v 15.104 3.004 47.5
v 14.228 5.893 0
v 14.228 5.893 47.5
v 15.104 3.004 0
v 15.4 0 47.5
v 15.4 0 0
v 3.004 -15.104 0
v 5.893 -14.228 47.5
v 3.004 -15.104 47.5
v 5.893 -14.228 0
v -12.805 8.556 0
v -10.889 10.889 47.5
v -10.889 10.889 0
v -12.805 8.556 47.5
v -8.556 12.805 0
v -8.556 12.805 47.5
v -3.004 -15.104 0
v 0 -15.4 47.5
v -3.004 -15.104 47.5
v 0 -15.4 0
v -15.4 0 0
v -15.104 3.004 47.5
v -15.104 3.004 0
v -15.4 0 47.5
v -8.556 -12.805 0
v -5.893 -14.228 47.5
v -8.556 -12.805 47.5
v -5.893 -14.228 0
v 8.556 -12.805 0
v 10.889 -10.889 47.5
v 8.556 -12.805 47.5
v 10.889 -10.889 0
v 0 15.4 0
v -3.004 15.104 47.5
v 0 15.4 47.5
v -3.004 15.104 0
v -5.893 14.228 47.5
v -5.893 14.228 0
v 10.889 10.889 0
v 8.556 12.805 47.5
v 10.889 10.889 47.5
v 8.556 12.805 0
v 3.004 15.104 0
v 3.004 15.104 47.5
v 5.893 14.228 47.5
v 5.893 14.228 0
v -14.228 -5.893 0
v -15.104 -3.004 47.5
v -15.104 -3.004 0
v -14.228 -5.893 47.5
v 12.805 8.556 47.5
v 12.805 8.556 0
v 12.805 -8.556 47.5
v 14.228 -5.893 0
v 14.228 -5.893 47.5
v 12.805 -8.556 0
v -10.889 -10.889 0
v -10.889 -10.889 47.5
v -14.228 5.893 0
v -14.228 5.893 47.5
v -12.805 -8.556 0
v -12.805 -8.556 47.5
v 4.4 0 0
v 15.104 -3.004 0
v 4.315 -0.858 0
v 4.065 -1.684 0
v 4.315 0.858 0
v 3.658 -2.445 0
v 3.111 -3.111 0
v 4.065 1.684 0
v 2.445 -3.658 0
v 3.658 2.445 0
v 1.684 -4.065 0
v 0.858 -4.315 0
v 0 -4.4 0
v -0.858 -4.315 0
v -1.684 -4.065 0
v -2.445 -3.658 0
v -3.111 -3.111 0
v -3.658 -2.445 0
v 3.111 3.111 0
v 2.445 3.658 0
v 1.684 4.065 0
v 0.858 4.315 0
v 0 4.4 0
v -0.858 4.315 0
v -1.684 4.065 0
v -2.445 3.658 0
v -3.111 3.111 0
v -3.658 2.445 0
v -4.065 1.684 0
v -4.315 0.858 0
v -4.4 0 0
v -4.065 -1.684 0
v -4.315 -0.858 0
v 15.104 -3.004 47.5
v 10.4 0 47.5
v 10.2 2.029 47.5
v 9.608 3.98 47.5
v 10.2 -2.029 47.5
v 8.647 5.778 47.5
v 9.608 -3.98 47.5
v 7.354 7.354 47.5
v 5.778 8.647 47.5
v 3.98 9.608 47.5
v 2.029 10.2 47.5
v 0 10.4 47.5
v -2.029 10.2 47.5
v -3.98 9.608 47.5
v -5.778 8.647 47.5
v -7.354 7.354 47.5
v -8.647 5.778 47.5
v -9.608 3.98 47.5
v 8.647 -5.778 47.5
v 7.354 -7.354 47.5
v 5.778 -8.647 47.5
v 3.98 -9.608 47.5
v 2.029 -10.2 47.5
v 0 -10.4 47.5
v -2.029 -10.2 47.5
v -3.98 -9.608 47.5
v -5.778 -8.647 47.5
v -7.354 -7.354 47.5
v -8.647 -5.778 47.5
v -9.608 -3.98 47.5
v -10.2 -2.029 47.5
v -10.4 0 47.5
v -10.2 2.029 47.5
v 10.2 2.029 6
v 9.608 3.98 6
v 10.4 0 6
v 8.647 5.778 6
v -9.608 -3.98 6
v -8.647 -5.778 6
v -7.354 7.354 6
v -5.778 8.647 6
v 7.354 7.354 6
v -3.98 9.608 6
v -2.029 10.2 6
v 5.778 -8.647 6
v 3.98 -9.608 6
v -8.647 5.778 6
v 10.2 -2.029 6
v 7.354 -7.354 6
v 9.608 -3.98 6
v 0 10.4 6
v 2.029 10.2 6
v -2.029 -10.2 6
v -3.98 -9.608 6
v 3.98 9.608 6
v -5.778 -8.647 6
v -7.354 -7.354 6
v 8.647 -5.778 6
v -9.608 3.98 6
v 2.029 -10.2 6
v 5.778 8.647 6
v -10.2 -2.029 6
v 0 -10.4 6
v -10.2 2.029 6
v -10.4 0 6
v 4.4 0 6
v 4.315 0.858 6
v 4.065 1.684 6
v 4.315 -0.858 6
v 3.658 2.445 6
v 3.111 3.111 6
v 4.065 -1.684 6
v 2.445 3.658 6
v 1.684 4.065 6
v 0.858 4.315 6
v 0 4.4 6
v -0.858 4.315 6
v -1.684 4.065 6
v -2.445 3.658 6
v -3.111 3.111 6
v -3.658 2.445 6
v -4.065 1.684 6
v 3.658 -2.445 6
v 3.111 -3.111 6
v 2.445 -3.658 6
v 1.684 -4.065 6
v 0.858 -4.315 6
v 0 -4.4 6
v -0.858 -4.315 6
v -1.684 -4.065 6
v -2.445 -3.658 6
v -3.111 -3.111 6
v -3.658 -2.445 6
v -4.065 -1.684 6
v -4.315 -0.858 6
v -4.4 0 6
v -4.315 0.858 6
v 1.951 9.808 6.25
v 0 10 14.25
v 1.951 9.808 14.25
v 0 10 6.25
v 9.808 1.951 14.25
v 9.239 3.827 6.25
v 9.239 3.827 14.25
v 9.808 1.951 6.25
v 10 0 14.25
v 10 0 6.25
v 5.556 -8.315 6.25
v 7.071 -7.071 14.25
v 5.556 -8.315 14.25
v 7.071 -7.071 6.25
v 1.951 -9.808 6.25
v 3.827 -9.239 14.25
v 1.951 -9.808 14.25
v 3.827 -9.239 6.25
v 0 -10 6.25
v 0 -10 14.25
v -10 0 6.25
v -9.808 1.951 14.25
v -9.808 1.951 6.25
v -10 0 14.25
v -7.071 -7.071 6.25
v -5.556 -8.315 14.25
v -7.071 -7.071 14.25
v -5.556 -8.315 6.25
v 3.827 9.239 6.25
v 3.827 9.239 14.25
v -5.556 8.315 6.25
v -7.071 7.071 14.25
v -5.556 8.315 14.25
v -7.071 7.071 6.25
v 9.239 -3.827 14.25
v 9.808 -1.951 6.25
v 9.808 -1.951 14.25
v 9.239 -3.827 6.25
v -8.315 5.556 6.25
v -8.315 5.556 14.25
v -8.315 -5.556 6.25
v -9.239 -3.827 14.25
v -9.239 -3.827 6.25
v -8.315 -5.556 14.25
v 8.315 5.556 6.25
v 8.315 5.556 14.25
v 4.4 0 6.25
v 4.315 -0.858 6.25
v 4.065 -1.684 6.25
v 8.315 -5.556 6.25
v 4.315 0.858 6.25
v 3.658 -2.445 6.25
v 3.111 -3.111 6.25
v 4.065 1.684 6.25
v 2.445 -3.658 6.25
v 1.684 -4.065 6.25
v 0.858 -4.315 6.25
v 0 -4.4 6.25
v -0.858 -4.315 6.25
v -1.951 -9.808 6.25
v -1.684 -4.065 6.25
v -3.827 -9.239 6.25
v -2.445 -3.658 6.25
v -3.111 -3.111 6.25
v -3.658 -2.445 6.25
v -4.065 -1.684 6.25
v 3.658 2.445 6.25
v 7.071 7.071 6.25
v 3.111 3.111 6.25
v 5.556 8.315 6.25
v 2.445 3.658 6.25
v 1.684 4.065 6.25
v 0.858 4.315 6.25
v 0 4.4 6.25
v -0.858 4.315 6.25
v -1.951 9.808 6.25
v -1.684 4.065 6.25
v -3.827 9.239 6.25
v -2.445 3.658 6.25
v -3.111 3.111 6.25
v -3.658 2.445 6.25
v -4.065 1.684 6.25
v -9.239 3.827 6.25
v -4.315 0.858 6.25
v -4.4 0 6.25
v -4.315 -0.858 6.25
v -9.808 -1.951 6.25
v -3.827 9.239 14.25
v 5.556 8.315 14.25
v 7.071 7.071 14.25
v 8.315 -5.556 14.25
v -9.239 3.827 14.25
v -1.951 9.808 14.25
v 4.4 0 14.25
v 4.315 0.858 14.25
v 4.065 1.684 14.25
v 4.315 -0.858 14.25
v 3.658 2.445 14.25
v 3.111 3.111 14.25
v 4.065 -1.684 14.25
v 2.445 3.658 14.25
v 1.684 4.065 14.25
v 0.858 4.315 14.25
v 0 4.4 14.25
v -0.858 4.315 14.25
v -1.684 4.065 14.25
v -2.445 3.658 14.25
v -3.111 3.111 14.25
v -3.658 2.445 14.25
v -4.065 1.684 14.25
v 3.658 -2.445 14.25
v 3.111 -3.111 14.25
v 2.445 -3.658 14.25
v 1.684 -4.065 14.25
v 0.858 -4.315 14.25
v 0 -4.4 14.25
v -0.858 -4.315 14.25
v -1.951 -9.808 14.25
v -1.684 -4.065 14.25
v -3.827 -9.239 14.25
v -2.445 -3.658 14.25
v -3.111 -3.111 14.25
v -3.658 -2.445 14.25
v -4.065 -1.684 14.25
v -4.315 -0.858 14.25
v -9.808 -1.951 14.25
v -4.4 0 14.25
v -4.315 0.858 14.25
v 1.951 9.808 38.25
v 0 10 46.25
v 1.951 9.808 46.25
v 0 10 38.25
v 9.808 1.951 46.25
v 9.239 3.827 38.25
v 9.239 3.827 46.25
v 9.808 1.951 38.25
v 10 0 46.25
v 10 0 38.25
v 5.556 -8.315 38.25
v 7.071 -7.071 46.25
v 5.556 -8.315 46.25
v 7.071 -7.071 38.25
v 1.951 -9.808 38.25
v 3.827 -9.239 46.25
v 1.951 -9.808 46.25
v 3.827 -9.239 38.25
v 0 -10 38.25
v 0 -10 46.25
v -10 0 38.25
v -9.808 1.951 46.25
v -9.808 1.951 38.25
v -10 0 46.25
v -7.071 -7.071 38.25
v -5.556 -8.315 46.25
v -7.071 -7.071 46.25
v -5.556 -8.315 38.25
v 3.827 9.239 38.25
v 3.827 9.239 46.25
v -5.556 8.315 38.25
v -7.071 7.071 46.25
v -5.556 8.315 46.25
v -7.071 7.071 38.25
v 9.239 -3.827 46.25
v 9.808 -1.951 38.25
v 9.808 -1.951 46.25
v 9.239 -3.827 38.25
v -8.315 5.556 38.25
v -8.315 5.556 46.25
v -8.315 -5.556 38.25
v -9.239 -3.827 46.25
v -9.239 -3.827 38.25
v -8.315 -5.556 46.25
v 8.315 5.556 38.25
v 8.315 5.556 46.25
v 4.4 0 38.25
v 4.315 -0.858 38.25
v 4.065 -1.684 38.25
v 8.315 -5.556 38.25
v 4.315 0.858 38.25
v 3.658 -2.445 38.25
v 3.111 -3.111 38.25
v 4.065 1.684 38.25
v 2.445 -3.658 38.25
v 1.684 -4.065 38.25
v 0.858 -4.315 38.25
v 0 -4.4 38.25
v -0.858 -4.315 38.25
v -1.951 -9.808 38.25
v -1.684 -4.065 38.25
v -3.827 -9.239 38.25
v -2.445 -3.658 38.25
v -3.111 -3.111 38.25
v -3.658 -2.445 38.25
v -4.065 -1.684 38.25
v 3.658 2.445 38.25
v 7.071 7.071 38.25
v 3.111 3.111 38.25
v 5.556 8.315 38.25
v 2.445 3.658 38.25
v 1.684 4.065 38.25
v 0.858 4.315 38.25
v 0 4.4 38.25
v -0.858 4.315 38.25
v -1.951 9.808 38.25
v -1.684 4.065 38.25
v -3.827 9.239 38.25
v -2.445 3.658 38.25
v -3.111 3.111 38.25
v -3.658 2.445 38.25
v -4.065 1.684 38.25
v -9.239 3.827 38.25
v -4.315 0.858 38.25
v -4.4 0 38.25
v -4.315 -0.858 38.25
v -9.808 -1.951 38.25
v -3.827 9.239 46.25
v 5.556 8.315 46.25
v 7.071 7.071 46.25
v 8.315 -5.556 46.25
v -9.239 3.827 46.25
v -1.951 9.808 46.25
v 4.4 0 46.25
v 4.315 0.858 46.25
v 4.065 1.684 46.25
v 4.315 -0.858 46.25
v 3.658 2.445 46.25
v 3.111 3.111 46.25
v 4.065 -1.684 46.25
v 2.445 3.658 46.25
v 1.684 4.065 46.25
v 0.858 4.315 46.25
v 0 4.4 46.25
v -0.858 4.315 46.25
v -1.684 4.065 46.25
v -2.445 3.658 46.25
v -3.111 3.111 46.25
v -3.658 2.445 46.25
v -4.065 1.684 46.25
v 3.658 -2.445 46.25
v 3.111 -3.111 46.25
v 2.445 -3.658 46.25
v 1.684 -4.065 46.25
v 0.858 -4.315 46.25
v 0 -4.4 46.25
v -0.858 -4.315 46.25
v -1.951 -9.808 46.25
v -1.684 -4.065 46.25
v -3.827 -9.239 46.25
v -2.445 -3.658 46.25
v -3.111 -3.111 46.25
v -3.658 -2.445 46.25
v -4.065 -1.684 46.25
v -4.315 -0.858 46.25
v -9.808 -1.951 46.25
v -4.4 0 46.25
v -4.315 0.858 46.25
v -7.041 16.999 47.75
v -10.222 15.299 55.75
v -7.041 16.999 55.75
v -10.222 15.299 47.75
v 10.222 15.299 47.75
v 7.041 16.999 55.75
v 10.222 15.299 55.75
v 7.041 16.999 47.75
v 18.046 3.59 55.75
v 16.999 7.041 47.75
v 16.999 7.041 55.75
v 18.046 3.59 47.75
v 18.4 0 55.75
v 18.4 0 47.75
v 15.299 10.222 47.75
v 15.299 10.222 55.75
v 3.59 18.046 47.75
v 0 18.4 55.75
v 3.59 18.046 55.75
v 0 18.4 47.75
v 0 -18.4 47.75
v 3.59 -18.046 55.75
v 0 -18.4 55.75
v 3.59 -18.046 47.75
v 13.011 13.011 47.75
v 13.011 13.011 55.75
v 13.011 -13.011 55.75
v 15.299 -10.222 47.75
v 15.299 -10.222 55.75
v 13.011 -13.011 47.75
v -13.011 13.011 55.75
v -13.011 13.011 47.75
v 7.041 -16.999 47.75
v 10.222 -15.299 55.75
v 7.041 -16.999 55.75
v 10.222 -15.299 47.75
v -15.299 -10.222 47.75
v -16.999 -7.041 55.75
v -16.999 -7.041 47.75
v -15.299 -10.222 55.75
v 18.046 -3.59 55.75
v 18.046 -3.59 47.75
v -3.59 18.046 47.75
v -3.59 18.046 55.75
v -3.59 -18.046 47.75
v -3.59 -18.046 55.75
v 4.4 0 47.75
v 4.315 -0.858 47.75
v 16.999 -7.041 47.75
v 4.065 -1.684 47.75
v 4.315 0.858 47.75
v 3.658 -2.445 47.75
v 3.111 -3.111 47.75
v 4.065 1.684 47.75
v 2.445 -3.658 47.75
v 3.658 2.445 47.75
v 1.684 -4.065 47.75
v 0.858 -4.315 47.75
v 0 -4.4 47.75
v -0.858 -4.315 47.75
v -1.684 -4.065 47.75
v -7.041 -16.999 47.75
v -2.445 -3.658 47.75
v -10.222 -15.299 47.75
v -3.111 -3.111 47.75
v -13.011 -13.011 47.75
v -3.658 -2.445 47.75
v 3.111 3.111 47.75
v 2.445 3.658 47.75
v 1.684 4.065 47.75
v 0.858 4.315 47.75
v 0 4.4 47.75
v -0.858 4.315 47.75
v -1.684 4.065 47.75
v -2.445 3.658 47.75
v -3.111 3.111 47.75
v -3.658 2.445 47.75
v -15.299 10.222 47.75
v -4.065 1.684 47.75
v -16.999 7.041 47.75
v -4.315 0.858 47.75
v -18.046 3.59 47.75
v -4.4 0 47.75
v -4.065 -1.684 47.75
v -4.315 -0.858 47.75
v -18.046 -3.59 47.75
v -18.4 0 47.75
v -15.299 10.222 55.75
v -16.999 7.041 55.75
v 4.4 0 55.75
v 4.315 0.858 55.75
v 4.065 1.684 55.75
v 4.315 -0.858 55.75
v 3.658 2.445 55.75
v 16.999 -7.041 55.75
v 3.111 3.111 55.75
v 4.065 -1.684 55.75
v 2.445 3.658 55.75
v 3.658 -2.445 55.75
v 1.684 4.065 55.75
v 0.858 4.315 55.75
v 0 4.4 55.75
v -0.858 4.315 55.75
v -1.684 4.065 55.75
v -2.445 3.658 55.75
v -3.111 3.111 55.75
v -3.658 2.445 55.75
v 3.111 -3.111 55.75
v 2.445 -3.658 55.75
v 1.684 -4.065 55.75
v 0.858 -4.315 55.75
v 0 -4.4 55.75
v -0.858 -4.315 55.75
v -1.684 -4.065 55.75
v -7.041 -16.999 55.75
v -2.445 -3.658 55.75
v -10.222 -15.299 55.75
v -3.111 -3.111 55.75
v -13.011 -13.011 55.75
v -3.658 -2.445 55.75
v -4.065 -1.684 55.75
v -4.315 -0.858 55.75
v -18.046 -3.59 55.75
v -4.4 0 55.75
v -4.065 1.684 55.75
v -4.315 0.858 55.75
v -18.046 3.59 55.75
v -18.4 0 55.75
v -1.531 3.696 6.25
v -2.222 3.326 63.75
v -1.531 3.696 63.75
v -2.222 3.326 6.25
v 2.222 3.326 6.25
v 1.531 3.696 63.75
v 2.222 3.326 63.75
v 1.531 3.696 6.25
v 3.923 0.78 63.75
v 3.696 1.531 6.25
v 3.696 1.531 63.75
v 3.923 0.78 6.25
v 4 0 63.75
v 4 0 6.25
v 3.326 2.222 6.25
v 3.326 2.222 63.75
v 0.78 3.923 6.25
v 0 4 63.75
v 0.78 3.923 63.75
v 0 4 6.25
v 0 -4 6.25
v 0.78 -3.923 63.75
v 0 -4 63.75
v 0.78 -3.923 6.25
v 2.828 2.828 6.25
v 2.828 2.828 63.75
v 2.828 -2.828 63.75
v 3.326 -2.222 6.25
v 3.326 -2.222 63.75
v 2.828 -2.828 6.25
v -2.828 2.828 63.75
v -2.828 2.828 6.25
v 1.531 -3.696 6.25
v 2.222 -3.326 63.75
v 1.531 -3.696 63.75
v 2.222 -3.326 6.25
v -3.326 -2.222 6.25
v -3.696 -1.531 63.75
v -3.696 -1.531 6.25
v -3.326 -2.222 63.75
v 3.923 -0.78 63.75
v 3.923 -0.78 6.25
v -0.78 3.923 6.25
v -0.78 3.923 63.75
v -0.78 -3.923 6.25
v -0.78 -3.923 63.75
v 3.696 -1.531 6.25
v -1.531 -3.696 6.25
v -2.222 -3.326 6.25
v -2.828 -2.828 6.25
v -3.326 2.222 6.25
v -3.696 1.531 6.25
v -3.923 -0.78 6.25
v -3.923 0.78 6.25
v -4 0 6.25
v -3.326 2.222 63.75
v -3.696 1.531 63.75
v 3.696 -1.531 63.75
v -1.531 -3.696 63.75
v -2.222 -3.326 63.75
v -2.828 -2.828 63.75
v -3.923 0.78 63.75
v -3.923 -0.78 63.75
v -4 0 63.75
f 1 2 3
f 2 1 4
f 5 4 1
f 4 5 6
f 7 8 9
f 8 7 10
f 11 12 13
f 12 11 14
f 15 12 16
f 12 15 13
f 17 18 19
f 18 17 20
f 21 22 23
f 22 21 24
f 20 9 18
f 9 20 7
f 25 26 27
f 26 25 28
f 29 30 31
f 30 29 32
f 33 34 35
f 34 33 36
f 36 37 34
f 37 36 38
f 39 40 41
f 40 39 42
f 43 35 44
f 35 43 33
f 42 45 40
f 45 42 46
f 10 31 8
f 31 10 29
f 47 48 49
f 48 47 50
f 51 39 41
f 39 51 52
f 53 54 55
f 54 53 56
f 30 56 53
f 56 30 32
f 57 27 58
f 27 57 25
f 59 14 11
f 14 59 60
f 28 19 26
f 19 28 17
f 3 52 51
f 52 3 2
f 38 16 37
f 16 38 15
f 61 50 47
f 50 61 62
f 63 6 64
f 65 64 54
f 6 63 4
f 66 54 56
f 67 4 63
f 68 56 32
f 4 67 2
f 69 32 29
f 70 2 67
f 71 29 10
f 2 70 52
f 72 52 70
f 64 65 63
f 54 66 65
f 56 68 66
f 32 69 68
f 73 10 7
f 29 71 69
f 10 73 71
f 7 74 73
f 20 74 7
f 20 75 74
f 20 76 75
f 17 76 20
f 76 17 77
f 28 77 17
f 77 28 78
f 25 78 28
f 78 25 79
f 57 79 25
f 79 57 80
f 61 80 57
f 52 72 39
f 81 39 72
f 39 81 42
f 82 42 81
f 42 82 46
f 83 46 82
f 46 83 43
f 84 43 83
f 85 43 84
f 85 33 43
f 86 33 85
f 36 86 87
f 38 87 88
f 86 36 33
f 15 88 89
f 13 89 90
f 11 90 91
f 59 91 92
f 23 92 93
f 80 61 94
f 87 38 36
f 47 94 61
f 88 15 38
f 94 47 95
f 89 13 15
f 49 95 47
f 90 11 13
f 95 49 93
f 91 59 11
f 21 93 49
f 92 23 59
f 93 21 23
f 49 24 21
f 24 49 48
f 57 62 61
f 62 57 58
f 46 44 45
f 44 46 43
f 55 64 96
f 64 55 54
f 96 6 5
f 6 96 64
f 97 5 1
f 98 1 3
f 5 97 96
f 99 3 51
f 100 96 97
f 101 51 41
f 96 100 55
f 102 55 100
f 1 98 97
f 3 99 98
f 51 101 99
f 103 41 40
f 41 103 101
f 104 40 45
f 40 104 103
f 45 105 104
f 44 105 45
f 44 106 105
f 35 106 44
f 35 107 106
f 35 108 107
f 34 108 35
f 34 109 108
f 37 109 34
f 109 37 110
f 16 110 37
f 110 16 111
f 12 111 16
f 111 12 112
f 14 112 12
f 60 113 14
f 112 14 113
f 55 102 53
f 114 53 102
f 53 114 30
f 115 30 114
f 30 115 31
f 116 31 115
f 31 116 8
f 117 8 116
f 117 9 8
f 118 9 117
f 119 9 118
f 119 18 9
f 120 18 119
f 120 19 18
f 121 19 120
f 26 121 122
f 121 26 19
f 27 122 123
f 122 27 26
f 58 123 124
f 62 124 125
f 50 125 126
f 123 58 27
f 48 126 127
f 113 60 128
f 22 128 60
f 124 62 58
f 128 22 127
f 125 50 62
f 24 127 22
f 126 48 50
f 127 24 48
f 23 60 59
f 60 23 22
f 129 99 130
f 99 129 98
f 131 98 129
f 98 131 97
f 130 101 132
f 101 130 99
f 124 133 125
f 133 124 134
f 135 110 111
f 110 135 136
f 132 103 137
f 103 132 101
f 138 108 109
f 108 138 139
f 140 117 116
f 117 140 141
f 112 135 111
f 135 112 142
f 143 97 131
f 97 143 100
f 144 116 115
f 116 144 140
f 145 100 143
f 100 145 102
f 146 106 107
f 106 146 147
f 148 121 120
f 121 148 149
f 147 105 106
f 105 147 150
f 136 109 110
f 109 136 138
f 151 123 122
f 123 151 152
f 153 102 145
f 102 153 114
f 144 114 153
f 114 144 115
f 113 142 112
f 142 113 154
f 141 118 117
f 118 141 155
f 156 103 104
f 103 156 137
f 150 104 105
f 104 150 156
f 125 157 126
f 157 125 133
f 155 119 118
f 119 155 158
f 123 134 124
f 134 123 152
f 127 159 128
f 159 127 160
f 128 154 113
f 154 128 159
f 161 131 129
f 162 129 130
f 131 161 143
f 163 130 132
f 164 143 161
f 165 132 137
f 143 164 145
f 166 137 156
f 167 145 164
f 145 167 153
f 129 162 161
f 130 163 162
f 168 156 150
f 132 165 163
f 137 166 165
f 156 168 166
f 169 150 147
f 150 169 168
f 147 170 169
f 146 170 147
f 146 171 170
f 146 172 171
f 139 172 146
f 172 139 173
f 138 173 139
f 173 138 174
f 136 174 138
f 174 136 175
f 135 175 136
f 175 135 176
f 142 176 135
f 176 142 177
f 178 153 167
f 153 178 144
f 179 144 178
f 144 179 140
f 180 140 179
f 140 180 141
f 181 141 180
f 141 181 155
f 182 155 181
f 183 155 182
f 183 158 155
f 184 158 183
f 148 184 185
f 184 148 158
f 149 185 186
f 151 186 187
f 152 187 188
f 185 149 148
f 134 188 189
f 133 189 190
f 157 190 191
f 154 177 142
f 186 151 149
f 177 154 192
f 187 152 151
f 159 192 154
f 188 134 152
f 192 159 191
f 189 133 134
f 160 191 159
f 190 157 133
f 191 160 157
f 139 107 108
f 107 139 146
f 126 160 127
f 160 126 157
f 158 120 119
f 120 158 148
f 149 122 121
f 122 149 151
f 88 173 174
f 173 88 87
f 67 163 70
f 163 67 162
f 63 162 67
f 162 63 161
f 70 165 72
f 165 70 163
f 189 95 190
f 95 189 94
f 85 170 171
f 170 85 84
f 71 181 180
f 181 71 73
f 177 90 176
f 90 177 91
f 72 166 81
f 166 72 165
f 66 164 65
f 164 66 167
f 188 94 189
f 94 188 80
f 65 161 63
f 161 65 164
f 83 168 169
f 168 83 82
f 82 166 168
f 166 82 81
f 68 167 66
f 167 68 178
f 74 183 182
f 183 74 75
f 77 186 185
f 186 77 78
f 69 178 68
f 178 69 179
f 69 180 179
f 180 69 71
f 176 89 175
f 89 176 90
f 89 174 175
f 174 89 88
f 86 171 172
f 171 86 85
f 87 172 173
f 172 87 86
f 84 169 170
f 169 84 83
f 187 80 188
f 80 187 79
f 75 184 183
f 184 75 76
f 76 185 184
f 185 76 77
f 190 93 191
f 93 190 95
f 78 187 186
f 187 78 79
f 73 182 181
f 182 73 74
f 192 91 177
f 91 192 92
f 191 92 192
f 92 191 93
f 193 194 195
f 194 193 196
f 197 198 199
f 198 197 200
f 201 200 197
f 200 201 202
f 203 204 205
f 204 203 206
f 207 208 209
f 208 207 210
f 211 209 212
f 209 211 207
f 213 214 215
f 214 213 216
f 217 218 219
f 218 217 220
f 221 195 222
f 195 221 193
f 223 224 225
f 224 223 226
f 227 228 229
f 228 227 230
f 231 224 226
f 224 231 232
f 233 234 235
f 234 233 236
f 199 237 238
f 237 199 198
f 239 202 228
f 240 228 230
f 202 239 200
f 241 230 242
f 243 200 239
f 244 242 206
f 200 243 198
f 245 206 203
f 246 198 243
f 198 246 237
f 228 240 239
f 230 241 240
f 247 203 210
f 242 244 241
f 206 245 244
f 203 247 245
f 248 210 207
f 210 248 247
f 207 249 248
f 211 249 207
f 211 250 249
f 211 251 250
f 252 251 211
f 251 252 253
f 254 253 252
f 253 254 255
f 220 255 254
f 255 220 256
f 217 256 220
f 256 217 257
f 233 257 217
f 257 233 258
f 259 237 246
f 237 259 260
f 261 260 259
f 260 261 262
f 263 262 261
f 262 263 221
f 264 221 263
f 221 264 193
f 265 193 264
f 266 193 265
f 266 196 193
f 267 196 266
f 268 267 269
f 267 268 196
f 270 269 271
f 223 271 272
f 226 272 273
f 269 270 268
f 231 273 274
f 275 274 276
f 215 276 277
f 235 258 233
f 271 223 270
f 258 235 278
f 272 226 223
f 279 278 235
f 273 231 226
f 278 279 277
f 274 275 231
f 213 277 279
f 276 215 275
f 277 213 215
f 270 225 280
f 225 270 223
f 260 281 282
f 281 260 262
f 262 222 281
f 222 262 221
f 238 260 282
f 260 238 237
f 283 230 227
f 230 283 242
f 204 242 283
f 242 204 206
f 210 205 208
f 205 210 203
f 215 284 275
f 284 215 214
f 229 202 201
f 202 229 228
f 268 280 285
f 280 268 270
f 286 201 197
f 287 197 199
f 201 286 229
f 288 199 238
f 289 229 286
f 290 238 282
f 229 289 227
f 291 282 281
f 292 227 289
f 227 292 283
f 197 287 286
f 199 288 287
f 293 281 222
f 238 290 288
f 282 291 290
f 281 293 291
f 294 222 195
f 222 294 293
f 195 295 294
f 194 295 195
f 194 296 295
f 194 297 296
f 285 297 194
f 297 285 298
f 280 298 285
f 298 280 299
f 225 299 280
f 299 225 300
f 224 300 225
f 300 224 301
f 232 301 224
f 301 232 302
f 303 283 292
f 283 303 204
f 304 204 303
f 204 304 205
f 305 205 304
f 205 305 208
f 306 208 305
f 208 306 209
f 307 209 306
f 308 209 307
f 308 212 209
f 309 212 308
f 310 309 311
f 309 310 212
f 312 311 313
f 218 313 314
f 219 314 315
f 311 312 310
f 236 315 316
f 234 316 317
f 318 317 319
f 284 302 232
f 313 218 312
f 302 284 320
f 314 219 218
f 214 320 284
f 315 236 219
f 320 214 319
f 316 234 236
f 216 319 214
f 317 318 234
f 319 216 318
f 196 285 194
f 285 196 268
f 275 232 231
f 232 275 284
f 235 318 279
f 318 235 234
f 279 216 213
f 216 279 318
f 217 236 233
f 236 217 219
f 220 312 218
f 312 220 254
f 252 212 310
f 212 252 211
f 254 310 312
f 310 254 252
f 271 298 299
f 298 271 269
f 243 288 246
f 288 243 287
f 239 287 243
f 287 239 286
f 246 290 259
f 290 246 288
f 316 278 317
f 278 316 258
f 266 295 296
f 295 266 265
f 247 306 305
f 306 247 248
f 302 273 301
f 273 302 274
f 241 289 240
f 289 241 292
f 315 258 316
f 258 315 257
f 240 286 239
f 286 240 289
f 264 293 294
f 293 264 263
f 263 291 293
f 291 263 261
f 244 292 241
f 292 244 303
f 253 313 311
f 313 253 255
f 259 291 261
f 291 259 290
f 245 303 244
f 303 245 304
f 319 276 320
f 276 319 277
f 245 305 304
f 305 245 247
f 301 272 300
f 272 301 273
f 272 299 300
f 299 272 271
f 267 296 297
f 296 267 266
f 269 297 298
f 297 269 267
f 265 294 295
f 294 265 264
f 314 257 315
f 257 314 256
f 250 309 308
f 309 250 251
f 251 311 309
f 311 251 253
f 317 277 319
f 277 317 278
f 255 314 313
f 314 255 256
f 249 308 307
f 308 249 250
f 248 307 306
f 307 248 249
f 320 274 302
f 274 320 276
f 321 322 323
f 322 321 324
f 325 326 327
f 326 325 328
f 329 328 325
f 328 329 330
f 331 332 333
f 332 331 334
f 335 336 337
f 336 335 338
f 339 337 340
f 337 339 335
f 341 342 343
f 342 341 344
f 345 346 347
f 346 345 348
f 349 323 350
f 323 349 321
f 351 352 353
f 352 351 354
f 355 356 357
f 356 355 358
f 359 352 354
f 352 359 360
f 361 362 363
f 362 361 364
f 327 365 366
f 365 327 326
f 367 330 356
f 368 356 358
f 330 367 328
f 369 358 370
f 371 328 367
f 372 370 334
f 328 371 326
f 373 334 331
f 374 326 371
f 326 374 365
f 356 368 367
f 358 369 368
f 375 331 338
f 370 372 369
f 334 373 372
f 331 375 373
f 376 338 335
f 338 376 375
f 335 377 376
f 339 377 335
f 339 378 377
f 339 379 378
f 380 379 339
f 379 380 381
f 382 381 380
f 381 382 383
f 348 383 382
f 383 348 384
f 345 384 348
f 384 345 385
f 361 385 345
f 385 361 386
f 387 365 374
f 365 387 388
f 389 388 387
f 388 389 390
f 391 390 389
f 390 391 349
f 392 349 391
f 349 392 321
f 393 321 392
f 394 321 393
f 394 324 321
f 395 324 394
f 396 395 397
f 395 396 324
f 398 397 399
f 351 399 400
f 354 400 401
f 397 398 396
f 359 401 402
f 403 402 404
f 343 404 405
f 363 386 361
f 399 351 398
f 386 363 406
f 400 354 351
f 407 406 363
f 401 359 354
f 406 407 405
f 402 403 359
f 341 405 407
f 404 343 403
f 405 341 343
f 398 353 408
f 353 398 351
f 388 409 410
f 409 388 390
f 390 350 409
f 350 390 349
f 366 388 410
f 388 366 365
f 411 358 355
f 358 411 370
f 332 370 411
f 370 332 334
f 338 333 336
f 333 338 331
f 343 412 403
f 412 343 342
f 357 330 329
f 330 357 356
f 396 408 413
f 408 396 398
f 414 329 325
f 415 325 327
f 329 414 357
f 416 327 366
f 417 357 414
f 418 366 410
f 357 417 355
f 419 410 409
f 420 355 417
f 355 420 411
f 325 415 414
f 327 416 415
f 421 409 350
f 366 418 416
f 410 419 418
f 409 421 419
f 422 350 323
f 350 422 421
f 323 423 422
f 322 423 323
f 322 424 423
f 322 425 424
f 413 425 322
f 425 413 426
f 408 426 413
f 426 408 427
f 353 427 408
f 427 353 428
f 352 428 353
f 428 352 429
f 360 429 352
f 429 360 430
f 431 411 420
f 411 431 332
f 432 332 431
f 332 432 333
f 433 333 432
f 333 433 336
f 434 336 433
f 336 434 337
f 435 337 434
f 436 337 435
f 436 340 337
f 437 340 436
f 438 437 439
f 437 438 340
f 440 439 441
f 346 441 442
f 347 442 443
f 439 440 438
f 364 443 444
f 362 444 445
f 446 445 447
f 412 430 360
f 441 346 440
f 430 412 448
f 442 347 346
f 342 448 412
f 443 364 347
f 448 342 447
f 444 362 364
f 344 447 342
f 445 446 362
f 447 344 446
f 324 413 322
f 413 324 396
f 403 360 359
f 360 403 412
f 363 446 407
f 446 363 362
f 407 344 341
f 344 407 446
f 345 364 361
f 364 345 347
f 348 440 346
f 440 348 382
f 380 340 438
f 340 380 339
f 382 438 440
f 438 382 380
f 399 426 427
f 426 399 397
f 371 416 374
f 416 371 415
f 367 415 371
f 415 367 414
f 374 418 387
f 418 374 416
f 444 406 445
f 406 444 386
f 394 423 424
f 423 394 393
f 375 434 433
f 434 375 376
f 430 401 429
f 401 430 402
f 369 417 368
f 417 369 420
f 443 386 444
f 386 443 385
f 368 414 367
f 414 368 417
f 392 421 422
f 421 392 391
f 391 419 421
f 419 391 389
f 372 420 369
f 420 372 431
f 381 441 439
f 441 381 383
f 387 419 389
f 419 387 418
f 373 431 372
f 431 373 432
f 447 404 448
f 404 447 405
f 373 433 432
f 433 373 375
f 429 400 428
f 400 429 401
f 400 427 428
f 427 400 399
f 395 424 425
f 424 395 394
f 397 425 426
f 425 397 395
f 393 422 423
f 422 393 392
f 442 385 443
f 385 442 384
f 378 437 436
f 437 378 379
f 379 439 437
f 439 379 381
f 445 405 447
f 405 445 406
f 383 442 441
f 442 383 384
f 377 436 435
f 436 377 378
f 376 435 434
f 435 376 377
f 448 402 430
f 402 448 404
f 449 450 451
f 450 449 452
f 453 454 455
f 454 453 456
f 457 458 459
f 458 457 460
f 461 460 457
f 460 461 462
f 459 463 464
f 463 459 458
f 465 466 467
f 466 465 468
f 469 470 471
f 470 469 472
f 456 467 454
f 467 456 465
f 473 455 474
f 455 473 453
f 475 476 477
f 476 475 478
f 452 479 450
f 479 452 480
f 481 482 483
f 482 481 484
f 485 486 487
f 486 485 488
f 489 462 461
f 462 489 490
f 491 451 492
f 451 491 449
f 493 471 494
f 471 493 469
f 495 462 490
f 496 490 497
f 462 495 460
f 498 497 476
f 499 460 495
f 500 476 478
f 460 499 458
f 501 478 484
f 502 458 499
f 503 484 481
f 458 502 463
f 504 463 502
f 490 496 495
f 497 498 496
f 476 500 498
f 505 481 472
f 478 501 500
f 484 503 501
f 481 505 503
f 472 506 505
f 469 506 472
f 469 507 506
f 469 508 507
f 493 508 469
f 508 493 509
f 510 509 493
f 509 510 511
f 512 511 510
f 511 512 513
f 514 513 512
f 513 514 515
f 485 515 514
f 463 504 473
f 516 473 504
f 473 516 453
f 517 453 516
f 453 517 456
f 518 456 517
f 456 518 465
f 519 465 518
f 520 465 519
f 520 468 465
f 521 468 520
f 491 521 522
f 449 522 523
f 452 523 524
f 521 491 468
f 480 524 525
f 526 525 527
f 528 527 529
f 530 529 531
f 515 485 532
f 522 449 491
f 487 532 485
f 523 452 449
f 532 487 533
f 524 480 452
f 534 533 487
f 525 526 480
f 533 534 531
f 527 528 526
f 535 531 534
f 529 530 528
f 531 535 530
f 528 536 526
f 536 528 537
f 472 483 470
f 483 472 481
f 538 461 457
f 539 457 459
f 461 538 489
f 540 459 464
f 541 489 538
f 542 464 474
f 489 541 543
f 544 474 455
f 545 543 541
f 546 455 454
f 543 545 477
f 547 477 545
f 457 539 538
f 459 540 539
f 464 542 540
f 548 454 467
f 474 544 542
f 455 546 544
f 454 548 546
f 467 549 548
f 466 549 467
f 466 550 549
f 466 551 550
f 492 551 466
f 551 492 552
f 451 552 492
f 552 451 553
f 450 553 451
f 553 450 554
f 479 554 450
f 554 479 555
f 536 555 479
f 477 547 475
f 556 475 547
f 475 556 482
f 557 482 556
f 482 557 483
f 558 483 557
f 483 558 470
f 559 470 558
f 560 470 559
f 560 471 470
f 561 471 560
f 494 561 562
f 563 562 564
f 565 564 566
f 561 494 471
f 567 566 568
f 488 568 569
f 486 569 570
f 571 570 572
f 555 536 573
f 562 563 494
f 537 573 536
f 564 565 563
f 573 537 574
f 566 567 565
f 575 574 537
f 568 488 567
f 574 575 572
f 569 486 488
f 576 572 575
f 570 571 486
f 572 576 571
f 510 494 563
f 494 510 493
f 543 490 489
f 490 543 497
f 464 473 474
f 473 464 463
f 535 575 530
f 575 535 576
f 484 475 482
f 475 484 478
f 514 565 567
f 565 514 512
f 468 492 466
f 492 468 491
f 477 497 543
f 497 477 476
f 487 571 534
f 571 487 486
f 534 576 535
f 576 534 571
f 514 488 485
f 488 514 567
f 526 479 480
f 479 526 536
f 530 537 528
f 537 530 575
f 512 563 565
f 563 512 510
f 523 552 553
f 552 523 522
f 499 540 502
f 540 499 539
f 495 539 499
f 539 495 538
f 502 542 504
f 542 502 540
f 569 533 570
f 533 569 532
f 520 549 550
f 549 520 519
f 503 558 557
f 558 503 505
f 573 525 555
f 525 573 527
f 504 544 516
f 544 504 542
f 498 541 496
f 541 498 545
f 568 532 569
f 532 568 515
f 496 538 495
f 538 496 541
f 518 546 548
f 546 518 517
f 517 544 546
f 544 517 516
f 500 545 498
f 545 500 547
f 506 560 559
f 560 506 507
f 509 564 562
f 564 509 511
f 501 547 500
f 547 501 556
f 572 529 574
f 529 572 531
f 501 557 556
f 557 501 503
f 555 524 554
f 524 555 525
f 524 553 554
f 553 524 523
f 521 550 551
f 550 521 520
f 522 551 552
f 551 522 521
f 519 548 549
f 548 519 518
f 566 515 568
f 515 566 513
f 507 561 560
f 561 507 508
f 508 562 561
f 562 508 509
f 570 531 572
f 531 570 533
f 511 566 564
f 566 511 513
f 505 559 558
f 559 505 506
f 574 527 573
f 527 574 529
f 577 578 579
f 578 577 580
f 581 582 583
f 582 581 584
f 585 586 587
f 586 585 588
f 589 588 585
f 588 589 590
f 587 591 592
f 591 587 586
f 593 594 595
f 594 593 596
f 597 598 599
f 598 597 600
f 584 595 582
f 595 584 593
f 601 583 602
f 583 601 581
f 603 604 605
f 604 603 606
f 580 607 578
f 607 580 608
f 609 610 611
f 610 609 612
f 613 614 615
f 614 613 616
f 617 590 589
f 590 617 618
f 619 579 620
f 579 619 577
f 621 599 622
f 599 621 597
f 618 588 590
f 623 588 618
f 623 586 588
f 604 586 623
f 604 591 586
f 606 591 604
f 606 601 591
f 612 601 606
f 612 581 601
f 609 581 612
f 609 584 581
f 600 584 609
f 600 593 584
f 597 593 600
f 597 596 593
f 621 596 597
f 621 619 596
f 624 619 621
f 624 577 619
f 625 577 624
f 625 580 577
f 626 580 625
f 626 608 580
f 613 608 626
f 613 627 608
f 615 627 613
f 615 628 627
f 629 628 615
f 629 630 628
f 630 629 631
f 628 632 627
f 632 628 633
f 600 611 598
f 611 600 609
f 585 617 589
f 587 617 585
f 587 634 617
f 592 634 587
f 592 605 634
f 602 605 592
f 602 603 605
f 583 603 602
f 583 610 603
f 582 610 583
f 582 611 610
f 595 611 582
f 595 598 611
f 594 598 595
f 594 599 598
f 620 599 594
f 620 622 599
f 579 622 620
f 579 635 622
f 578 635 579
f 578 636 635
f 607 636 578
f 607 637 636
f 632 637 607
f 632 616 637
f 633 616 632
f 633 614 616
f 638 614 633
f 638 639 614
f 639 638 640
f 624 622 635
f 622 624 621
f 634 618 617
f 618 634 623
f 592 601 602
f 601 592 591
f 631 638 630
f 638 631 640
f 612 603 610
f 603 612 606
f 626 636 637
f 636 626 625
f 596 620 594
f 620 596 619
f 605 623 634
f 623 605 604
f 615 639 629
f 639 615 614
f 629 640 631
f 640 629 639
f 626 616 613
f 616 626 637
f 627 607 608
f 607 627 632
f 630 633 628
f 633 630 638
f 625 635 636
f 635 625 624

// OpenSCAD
$fn = 32;

// ------------------------------------------------------------------------
// Shaft station: cup d30.8 x 47.5 mm, shaft d8
// Every part is its own module, assembly() places every instance.
// ------------------------------------------------------------------------

// --- part 1 ---
module housing_cup() {
  difference() {
    cylinder(h = 47.5, d = 30.8);
    translate([0, 0, 6]) cylinder(h = 42.5, d = 20.8);
    translate([0, 0, -1]) cylinder(h = 8, d = 8.8);
  }
}

// --- part 2 ---
module bearing_lower() {
  difference() {
      translate([0, 0, 0]) cylinder(h = 8, d = 20);
      translate([0, 0, -1]) cylinder(h = 10, d = 8.8);
    }
}

// --- part 3 ---
module bearing_upper() {
  difference() {
      translate([0, 0, 0]) cylinder(h = 8, d = 20);
      translate([0, 0, -1]) cylinder(h = 10, d = 8.8);
    }
}

// --- part 4 ---
module station_shaft() {
  translate([0, 0, -28.75]) cylinder(h = 57.5, d = 8);
}

// --- part 5 ---
module station_cover() {
  difference() {
    cylinder(h = 8, d = 36.8);
    translate([0, 0, -1]) cylinder(h = 10, d = 8.8);
  }
}

// --- assembly ---
module assembly() {
  color([0.80, 0.24, 0.20]) translate([0, 0, 0]) rotate([0, 0, 0]) housing_cup();
  color([0.20, 0.45, 0.75]) translate([0, 0, 6.25]) rotate([0, 0, 0]) bearing_lower();
  color([0.25, 0.62, 0.32]) translate([0, 0, 38.25]) rotate([0, 0, 0]) bearing_upper();
  color([0.92, 0.70, 0.18]) translate([0, 0, 35]) rotate([0, 0, 0]) station_shaft();
  color([0.58, 0.35, 0.70]) translate([0, 0, 47.75]) rotate([0, 0, 0]) station_cover();
}

assembly();
